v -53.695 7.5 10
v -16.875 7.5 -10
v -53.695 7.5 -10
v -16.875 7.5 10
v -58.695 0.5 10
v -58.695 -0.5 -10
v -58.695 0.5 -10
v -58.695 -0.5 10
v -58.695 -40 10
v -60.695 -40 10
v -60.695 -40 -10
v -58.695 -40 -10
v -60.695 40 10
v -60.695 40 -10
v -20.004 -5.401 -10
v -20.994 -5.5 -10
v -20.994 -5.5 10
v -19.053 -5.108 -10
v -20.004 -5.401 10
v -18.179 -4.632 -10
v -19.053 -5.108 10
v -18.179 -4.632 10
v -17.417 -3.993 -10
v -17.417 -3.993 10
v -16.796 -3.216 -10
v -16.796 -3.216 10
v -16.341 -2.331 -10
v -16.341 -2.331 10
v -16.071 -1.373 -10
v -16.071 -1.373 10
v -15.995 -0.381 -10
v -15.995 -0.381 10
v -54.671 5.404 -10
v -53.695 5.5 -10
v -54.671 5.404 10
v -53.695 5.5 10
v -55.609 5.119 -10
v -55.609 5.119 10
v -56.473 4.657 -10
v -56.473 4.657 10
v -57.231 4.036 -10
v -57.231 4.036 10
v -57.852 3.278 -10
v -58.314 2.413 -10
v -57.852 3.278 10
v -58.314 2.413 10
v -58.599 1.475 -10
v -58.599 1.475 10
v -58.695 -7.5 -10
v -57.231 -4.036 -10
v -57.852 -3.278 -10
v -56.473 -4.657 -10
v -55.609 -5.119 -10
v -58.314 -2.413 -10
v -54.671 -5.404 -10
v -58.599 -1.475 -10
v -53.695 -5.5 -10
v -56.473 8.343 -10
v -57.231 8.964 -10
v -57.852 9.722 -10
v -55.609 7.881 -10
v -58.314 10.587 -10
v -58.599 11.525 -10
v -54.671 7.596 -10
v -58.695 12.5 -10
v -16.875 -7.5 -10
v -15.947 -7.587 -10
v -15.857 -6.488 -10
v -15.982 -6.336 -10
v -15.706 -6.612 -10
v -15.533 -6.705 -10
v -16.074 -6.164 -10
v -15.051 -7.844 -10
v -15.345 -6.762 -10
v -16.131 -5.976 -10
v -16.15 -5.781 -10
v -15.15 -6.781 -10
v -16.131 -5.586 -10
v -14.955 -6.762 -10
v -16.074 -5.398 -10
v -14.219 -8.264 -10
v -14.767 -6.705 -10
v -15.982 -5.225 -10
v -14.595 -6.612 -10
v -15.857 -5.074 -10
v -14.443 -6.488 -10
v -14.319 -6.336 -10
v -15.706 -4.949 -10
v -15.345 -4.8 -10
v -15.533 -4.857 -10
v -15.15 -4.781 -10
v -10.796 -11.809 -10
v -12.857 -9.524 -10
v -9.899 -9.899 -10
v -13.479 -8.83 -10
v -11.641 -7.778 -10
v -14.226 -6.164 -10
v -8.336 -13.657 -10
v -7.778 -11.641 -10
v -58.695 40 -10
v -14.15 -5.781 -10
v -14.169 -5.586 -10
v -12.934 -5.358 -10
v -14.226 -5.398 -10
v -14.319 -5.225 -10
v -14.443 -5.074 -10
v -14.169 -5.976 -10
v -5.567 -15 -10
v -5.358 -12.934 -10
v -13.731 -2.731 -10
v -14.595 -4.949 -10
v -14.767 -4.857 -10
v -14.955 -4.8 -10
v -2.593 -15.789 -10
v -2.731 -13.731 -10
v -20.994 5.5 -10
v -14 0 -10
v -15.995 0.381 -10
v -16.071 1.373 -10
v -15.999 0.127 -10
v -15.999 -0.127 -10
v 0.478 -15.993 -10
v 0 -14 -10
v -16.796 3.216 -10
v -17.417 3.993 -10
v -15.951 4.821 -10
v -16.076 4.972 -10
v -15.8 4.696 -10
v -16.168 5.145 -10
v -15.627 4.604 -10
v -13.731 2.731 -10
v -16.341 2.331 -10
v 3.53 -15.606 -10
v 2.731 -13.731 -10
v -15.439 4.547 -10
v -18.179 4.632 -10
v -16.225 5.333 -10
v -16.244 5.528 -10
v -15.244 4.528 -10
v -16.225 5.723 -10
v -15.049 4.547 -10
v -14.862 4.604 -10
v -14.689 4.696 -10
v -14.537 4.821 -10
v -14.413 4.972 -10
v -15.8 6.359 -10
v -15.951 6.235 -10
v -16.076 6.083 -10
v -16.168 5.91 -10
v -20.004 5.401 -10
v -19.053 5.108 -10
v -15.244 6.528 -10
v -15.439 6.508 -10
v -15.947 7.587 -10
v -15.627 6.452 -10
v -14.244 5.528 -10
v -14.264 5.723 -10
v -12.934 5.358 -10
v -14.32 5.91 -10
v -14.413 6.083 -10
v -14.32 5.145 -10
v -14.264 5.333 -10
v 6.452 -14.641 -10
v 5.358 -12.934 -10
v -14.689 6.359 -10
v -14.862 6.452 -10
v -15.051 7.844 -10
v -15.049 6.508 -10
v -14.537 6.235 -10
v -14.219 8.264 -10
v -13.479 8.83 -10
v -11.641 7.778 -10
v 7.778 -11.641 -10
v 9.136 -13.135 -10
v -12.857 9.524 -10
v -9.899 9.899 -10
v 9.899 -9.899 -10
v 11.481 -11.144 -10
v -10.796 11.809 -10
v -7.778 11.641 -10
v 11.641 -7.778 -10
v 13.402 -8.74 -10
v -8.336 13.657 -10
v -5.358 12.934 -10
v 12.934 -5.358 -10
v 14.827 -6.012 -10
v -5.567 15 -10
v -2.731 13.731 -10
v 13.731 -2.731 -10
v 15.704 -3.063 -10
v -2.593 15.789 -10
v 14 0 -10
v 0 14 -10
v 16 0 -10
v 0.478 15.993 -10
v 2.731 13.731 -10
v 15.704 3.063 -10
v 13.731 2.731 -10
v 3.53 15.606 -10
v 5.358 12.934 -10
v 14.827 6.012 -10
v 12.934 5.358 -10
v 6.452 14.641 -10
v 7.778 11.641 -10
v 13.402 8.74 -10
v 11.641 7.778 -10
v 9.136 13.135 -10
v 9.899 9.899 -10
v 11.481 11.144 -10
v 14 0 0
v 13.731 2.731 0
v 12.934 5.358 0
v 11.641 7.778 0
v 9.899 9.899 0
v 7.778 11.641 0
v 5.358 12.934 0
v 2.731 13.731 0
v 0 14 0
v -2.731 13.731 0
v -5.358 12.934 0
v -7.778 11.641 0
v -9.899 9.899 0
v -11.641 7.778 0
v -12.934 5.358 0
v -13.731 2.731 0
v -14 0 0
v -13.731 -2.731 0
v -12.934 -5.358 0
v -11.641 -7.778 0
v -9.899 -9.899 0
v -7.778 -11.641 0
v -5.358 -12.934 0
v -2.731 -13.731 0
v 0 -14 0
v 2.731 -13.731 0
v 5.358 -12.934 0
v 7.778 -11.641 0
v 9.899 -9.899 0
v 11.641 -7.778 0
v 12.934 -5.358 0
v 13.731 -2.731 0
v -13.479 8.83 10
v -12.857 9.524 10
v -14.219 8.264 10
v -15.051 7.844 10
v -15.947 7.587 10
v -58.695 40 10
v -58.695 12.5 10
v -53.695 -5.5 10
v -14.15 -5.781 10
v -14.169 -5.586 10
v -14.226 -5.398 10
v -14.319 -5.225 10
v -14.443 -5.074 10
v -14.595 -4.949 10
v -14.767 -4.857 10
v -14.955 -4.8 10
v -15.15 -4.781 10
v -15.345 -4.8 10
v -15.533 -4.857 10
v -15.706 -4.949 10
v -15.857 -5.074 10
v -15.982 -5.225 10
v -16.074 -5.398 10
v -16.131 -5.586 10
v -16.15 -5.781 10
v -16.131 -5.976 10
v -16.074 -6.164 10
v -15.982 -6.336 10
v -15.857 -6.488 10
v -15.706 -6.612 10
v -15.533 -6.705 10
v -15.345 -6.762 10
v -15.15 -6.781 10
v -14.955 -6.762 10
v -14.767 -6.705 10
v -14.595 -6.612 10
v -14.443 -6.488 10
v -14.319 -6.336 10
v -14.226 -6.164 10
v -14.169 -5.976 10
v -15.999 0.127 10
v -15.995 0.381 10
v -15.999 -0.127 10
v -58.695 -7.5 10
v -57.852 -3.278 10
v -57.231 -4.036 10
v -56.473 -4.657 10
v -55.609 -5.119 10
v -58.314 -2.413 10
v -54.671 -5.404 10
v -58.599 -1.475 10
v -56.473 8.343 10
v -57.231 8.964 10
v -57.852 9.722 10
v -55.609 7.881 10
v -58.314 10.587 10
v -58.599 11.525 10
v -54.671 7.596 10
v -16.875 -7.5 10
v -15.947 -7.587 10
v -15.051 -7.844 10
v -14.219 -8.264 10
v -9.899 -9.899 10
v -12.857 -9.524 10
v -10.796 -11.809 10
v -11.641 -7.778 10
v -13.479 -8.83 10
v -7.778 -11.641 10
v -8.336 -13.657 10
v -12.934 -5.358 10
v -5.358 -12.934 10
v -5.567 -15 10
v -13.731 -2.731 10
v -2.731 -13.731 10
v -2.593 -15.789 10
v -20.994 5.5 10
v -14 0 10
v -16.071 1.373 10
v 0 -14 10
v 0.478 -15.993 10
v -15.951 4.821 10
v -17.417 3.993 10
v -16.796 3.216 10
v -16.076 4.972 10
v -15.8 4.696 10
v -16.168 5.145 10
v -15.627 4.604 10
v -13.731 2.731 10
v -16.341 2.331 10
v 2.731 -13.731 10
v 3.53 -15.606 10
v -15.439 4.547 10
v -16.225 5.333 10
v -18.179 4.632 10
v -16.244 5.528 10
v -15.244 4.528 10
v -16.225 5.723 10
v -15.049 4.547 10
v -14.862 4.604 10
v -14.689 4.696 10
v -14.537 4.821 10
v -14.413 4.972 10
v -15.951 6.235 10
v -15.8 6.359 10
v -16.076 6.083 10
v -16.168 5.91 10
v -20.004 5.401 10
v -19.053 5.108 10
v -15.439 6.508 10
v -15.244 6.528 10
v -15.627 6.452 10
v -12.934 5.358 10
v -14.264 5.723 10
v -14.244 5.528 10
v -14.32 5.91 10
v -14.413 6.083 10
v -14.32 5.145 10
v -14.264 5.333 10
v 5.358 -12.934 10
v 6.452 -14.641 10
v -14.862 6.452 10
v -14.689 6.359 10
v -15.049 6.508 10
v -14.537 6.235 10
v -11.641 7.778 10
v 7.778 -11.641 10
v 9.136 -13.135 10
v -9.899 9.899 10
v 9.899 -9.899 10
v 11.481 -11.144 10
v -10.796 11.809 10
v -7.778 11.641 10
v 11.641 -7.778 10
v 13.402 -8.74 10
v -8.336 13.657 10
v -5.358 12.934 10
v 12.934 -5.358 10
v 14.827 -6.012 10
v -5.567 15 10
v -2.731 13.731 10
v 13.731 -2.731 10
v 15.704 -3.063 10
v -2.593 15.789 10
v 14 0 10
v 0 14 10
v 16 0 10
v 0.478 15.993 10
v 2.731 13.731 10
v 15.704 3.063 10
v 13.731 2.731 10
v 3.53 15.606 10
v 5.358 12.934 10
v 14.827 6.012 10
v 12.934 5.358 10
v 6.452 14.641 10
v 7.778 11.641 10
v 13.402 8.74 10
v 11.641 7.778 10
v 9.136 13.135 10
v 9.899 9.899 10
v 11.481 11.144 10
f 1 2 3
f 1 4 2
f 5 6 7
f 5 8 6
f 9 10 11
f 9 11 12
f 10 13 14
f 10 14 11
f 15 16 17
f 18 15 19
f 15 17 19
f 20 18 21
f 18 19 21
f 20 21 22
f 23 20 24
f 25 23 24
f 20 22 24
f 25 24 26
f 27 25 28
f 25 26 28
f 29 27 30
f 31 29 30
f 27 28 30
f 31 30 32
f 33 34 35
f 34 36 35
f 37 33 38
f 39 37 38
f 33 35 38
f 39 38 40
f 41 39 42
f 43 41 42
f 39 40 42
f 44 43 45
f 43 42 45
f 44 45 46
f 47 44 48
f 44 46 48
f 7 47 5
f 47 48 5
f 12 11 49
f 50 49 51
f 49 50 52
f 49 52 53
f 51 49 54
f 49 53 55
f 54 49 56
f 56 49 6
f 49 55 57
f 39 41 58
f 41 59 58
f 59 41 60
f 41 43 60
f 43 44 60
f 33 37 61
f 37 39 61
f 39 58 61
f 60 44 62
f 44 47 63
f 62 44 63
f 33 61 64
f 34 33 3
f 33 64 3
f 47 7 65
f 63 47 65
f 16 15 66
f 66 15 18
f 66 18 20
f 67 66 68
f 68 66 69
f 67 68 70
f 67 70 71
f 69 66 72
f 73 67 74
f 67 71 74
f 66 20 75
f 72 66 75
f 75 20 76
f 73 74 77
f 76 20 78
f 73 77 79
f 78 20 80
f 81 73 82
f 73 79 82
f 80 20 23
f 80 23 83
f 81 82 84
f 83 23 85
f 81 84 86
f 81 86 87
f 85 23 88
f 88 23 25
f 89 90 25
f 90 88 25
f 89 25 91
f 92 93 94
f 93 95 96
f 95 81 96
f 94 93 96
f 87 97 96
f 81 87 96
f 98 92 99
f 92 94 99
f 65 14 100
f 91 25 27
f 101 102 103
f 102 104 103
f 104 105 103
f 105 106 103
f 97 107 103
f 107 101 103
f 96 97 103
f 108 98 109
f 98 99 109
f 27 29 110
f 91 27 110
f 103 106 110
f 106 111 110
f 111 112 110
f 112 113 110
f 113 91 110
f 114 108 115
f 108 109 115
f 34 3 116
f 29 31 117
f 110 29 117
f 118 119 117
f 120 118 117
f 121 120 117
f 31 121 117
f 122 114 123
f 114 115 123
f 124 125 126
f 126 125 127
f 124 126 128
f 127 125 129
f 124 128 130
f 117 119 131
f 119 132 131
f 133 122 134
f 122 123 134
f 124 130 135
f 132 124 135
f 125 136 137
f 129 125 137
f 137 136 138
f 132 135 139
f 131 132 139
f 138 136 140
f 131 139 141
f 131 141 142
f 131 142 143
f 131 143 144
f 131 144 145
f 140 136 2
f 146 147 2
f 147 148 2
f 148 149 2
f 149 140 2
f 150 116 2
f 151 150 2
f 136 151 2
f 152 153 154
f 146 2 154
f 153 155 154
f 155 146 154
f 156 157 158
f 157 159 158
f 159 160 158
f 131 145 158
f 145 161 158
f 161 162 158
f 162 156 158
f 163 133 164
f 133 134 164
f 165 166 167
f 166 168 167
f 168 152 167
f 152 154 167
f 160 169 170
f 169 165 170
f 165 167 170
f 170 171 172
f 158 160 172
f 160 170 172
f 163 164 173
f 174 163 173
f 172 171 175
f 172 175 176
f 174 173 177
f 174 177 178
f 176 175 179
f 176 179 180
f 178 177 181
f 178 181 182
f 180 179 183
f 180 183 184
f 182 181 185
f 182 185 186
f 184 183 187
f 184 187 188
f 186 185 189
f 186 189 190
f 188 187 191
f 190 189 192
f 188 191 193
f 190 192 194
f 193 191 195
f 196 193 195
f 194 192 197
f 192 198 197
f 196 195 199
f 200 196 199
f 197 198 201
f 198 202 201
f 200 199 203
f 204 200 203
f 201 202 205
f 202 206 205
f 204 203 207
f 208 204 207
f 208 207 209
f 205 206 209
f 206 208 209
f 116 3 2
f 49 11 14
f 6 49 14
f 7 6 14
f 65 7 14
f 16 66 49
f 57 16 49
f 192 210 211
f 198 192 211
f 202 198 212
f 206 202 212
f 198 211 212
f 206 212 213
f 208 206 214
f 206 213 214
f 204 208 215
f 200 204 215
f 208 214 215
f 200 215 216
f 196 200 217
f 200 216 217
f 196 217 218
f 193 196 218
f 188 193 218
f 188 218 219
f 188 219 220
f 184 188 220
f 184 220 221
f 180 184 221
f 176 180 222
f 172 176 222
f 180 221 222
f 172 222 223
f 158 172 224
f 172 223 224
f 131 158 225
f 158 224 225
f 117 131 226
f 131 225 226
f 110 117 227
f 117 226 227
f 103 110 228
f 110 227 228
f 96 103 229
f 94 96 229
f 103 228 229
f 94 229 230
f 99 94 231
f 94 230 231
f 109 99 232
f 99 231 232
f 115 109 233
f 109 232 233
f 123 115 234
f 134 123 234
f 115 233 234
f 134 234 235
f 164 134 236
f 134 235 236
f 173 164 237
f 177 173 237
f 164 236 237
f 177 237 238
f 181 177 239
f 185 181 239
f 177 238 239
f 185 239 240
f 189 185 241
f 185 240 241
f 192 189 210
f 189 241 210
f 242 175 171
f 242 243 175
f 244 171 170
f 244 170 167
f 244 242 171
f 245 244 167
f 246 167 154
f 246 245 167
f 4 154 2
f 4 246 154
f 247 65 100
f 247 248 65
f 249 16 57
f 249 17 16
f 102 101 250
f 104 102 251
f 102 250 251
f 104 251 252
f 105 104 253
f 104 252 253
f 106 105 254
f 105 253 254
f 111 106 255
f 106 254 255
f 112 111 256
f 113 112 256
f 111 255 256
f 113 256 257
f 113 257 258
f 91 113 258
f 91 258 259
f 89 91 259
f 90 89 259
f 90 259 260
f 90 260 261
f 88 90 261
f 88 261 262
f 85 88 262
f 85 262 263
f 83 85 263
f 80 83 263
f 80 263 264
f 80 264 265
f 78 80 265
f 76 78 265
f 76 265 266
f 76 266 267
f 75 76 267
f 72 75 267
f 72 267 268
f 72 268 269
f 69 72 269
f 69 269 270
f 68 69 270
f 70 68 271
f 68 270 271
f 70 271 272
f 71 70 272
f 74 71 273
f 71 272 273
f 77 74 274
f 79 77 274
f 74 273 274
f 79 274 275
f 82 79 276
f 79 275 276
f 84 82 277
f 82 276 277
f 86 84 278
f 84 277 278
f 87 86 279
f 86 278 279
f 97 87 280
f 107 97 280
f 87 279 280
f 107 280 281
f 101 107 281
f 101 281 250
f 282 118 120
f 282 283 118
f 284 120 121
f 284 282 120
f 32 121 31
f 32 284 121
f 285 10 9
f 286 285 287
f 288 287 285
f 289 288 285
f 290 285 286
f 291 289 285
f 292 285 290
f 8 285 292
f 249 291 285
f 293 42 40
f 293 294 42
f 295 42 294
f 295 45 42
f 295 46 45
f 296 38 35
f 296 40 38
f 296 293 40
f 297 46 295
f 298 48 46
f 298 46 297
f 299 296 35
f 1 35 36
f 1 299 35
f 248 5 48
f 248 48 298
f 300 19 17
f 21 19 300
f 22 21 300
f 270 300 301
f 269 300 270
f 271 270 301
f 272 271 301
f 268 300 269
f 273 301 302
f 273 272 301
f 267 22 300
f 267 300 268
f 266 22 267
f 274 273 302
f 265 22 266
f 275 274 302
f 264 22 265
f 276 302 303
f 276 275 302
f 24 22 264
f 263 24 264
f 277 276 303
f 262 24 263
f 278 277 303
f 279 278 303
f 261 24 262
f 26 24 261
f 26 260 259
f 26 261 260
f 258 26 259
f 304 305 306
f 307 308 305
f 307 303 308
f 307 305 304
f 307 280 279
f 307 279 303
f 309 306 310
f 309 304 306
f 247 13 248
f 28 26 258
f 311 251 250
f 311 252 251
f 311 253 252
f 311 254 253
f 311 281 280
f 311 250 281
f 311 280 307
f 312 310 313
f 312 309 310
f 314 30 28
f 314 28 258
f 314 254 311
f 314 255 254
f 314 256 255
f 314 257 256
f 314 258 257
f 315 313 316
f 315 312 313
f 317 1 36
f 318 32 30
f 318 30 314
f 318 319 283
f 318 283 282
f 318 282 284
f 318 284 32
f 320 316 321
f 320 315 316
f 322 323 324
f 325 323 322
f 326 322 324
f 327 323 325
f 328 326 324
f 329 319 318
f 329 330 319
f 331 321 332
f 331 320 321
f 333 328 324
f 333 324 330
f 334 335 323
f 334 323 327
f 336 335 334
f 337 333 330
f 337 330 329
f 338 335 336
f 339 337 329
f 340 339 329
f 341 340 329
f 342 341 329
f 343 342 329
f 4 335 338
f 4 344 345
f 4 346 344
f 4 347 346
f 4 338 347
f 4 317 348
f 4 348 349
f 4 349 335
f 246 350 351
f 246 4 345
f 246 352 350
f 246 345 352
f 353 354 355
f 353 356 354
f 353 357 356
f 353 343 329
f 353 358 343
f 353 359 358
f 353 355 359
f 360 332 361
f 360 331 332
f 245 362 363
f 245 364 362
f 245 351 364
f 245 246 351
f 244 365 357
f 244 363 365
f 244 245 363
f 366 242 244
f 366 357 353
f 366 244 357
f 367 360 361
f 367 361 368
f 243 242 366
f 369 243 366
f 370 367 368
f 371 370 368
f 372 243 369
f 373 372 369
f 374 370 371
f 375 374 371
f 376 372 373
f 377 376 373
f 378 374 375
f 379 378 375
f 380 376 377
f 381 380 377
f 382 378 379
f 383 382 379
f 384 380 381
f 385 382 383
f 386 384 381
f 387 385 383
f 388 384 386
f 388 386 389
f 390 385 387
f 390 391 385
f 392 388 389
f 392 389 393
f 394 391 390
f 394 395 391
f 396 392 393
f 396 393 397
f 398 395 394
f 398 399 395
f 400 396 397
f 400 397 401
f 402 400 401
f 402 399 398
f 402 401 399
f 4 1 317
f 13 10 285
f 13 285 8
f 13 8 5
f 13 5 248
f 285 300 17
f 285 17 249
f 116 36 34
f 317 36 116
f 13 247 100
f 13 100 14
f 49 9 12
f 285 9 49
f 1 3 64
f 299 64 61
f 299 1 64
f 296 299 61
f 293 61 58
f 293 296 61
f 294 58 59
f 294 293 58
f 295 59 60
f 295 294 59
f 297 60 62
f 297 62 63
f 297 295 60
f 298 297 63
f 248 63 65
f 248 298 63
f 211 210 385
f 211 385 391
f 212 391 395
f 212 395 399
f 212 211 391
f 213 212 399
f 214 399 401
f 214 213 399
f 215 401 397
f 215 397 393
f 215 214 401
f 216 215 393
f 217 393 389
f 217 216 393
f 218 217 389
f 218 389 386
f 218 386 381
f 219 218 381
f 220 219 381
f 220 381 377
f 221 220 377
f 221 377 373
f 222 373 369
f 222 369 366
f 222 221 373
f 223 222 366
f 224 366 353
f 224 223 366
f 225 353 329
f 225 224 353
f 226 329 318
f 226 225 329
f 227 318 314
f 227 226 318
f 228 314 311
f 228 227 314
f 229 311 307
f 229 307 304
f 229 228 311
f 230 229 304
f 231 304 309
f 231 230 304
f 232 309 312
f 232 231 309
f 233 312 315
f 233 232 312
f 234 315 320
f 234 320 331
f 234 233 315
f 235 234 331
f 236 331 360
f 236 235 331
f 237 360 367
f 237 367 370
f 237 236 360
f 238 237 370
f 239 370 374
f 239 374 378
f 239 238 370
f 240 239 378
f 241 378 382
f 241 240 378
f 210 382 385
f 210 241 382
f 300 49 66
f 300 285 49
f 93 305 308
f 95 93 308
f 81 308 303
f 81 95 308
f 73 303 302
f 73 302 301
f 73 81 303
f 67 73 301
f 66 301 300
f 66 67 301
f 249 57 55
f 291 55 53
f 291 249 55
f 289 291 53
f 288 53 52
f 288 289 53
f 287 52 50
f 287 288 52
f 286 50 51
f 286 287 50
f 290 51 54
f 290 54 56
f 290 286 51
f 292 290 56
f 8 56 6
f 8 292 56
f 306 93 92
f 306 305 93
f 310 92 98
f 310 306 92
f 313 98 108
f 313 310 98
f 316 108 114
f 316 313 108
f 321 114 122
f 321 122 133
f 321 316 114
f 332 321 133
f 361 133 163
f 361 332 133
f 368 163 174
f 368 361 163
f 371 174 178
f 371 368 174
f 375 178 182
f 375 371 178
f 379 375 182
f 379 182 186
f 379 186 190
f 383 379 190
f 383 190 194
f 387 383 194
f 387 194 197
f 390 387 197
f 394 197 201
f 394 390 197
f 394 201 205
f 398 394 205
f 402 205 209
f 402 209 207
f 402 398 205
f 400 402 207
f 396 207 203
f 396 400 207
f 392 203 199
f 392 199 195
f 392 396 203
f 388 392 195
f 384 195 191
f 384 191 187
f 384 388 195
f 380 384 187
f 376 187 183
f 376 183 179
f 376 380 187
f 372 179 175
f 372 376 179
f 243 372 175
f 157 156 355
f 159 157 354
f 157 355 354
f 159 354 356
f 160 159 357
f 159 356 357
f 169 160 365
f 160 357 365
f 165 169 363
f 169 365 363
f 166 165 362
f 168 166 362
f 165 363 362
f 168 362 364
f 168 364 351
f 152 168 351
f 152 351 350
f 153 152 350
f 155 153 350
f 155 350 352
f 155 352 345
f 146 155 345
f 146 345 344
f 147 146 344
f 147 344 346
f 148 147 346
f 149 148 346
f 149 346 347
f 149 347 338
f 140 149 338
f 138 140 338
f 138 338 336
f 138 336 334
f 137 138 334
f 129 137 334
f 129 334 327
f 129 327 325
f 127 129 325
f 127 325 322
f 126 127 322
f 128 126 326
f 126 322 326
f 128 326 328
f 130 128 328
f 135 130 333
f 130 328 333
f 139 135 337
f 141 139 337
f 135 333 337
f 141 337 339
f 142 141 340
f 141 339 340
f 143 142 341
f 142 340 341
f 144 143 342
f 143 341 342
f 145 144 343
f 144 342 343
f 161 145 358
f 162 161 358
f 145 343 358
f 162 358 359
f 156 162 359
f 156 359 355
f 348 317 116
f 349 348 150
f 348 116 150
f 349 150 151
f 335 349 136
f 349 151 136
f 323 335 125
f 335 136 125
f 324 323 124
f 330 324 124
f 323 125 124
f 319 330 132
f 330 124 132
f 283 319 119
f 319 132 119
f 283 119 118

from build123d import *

# Parameters (mm, degrees)
F0_R          = 14
F1_DEPTH      = 10
F1_DEPTH_BACK = 10
F2_R          = 5
F3_R          = 5
F4_R          = 1
F5_DEPTH      = 25
F6_R          = 5


with BuildPart() as f1:
    # F0 (on Top) → F1 (new body, two sides)
    with BuildSketch(Plane.XY) as f1_sk:
        with BuildLine():
            ThreePointArc((-14.1332940251, -7.5), (3.86440782, -15.5263116097), (16, 0))
            ThreePointArc((16, 0), (3.86440782, 15.5263116097), (-14.1332940251, 7.5))
            ThreePointArc((-14.1332940251, 7.5), (-14.6133919535, 6.5152724896), (-15.0249792013, 5.5))
            ThreePointArc((-15.0249792013, 5.5), (-16, 0), (-15.0249792013, -5.5))
            ThreePointArc((-15.0249792013, -5.5), (-14.6133919535, -6.5152724896), (-14.1332940251, -7.5))
        make_face()
        Circle(F0_R, mode=Mode.SUBTRACT)
        with BuildLine():
            ThreePointArc((-15.0249792013, 5.5), (-14.6133919535, 6.5152724896), (-14.1332940251, 7.5))
            Line((-14.1332940251, 7.5), (-58.6950893998, 7.5))
            Line((-58.6950893998, 7.5), (-58.6950893998, 40))
            Line((-58.6950893998, 40), (-60.6950893998, 40))
            Line((-60.6950893998, 40), (-60.6950893998, -40))
            Line((-60.6950893998, -40), (-58.6950893998, -40))
            Line((-58.6950893998, -40), (-58.6950893998, -7.5))
            Line((-58.6950893998, -7.5), (-14.1332940251, -7.5))
            ThreePointArc((-14.1332940251, -7.5), (-14.6133919535, -6.5152724896), (-15.0249792013, -5.5))
            Line((-15.0249792013, -5.5), (-58.6950893998, -5.5))
            Line((-58.6950893998, -5.5), (-58.6950893998, 5.5))
            Line((-58.6950893998, 5.5), (-15.0249792013, 5.5))
        make_face()
    extrude(amount=F1_DEPTH)
    extrude(f1_sk.sketch, amount=-F1_DEPTH_BACK)

    # F2
    f2_edges = [f1.edges().sort_by_distance(p)[0] for p in [
        (-14.133294, -7.5, 0),
        (-15.024979, -5.5, 0),
        (-15.024979, 5.5, 0),
        (-14.133294, 7.5, 0),
    ]]
    fillet(f2_edges, radius=F2_R)

    # F3
    f3_edges = [f1.edges().sort_by_distance(p)[0] for p in [
        (-58.695089, -5.5, 0),
        (-58.695089, 5.5, 0),
    ]]
    fillet(f3_edges, radius=F3_R)

    # F4 (on face) → F5 (cut)
    with BuildSketch(Plane.XY.offset(10)):
        with Locations((-15.1501176879, -5.7808761485)):
            Circle(F4_R)
        with Locations((-15.2443397102, 5.5276307583)):
            Circle(F4_R)
    extrude(amount=-F5_DEPTH, mode=Mode.SUBTRACT)

    # F6
    f6_edges = [f1.edges().sort_by_distance(p)[0] for p in [
        (-58.695089, 7.5, 0),
    ]]
    fillet(f6_edges, radius=F6_R)


solid = f1.part
